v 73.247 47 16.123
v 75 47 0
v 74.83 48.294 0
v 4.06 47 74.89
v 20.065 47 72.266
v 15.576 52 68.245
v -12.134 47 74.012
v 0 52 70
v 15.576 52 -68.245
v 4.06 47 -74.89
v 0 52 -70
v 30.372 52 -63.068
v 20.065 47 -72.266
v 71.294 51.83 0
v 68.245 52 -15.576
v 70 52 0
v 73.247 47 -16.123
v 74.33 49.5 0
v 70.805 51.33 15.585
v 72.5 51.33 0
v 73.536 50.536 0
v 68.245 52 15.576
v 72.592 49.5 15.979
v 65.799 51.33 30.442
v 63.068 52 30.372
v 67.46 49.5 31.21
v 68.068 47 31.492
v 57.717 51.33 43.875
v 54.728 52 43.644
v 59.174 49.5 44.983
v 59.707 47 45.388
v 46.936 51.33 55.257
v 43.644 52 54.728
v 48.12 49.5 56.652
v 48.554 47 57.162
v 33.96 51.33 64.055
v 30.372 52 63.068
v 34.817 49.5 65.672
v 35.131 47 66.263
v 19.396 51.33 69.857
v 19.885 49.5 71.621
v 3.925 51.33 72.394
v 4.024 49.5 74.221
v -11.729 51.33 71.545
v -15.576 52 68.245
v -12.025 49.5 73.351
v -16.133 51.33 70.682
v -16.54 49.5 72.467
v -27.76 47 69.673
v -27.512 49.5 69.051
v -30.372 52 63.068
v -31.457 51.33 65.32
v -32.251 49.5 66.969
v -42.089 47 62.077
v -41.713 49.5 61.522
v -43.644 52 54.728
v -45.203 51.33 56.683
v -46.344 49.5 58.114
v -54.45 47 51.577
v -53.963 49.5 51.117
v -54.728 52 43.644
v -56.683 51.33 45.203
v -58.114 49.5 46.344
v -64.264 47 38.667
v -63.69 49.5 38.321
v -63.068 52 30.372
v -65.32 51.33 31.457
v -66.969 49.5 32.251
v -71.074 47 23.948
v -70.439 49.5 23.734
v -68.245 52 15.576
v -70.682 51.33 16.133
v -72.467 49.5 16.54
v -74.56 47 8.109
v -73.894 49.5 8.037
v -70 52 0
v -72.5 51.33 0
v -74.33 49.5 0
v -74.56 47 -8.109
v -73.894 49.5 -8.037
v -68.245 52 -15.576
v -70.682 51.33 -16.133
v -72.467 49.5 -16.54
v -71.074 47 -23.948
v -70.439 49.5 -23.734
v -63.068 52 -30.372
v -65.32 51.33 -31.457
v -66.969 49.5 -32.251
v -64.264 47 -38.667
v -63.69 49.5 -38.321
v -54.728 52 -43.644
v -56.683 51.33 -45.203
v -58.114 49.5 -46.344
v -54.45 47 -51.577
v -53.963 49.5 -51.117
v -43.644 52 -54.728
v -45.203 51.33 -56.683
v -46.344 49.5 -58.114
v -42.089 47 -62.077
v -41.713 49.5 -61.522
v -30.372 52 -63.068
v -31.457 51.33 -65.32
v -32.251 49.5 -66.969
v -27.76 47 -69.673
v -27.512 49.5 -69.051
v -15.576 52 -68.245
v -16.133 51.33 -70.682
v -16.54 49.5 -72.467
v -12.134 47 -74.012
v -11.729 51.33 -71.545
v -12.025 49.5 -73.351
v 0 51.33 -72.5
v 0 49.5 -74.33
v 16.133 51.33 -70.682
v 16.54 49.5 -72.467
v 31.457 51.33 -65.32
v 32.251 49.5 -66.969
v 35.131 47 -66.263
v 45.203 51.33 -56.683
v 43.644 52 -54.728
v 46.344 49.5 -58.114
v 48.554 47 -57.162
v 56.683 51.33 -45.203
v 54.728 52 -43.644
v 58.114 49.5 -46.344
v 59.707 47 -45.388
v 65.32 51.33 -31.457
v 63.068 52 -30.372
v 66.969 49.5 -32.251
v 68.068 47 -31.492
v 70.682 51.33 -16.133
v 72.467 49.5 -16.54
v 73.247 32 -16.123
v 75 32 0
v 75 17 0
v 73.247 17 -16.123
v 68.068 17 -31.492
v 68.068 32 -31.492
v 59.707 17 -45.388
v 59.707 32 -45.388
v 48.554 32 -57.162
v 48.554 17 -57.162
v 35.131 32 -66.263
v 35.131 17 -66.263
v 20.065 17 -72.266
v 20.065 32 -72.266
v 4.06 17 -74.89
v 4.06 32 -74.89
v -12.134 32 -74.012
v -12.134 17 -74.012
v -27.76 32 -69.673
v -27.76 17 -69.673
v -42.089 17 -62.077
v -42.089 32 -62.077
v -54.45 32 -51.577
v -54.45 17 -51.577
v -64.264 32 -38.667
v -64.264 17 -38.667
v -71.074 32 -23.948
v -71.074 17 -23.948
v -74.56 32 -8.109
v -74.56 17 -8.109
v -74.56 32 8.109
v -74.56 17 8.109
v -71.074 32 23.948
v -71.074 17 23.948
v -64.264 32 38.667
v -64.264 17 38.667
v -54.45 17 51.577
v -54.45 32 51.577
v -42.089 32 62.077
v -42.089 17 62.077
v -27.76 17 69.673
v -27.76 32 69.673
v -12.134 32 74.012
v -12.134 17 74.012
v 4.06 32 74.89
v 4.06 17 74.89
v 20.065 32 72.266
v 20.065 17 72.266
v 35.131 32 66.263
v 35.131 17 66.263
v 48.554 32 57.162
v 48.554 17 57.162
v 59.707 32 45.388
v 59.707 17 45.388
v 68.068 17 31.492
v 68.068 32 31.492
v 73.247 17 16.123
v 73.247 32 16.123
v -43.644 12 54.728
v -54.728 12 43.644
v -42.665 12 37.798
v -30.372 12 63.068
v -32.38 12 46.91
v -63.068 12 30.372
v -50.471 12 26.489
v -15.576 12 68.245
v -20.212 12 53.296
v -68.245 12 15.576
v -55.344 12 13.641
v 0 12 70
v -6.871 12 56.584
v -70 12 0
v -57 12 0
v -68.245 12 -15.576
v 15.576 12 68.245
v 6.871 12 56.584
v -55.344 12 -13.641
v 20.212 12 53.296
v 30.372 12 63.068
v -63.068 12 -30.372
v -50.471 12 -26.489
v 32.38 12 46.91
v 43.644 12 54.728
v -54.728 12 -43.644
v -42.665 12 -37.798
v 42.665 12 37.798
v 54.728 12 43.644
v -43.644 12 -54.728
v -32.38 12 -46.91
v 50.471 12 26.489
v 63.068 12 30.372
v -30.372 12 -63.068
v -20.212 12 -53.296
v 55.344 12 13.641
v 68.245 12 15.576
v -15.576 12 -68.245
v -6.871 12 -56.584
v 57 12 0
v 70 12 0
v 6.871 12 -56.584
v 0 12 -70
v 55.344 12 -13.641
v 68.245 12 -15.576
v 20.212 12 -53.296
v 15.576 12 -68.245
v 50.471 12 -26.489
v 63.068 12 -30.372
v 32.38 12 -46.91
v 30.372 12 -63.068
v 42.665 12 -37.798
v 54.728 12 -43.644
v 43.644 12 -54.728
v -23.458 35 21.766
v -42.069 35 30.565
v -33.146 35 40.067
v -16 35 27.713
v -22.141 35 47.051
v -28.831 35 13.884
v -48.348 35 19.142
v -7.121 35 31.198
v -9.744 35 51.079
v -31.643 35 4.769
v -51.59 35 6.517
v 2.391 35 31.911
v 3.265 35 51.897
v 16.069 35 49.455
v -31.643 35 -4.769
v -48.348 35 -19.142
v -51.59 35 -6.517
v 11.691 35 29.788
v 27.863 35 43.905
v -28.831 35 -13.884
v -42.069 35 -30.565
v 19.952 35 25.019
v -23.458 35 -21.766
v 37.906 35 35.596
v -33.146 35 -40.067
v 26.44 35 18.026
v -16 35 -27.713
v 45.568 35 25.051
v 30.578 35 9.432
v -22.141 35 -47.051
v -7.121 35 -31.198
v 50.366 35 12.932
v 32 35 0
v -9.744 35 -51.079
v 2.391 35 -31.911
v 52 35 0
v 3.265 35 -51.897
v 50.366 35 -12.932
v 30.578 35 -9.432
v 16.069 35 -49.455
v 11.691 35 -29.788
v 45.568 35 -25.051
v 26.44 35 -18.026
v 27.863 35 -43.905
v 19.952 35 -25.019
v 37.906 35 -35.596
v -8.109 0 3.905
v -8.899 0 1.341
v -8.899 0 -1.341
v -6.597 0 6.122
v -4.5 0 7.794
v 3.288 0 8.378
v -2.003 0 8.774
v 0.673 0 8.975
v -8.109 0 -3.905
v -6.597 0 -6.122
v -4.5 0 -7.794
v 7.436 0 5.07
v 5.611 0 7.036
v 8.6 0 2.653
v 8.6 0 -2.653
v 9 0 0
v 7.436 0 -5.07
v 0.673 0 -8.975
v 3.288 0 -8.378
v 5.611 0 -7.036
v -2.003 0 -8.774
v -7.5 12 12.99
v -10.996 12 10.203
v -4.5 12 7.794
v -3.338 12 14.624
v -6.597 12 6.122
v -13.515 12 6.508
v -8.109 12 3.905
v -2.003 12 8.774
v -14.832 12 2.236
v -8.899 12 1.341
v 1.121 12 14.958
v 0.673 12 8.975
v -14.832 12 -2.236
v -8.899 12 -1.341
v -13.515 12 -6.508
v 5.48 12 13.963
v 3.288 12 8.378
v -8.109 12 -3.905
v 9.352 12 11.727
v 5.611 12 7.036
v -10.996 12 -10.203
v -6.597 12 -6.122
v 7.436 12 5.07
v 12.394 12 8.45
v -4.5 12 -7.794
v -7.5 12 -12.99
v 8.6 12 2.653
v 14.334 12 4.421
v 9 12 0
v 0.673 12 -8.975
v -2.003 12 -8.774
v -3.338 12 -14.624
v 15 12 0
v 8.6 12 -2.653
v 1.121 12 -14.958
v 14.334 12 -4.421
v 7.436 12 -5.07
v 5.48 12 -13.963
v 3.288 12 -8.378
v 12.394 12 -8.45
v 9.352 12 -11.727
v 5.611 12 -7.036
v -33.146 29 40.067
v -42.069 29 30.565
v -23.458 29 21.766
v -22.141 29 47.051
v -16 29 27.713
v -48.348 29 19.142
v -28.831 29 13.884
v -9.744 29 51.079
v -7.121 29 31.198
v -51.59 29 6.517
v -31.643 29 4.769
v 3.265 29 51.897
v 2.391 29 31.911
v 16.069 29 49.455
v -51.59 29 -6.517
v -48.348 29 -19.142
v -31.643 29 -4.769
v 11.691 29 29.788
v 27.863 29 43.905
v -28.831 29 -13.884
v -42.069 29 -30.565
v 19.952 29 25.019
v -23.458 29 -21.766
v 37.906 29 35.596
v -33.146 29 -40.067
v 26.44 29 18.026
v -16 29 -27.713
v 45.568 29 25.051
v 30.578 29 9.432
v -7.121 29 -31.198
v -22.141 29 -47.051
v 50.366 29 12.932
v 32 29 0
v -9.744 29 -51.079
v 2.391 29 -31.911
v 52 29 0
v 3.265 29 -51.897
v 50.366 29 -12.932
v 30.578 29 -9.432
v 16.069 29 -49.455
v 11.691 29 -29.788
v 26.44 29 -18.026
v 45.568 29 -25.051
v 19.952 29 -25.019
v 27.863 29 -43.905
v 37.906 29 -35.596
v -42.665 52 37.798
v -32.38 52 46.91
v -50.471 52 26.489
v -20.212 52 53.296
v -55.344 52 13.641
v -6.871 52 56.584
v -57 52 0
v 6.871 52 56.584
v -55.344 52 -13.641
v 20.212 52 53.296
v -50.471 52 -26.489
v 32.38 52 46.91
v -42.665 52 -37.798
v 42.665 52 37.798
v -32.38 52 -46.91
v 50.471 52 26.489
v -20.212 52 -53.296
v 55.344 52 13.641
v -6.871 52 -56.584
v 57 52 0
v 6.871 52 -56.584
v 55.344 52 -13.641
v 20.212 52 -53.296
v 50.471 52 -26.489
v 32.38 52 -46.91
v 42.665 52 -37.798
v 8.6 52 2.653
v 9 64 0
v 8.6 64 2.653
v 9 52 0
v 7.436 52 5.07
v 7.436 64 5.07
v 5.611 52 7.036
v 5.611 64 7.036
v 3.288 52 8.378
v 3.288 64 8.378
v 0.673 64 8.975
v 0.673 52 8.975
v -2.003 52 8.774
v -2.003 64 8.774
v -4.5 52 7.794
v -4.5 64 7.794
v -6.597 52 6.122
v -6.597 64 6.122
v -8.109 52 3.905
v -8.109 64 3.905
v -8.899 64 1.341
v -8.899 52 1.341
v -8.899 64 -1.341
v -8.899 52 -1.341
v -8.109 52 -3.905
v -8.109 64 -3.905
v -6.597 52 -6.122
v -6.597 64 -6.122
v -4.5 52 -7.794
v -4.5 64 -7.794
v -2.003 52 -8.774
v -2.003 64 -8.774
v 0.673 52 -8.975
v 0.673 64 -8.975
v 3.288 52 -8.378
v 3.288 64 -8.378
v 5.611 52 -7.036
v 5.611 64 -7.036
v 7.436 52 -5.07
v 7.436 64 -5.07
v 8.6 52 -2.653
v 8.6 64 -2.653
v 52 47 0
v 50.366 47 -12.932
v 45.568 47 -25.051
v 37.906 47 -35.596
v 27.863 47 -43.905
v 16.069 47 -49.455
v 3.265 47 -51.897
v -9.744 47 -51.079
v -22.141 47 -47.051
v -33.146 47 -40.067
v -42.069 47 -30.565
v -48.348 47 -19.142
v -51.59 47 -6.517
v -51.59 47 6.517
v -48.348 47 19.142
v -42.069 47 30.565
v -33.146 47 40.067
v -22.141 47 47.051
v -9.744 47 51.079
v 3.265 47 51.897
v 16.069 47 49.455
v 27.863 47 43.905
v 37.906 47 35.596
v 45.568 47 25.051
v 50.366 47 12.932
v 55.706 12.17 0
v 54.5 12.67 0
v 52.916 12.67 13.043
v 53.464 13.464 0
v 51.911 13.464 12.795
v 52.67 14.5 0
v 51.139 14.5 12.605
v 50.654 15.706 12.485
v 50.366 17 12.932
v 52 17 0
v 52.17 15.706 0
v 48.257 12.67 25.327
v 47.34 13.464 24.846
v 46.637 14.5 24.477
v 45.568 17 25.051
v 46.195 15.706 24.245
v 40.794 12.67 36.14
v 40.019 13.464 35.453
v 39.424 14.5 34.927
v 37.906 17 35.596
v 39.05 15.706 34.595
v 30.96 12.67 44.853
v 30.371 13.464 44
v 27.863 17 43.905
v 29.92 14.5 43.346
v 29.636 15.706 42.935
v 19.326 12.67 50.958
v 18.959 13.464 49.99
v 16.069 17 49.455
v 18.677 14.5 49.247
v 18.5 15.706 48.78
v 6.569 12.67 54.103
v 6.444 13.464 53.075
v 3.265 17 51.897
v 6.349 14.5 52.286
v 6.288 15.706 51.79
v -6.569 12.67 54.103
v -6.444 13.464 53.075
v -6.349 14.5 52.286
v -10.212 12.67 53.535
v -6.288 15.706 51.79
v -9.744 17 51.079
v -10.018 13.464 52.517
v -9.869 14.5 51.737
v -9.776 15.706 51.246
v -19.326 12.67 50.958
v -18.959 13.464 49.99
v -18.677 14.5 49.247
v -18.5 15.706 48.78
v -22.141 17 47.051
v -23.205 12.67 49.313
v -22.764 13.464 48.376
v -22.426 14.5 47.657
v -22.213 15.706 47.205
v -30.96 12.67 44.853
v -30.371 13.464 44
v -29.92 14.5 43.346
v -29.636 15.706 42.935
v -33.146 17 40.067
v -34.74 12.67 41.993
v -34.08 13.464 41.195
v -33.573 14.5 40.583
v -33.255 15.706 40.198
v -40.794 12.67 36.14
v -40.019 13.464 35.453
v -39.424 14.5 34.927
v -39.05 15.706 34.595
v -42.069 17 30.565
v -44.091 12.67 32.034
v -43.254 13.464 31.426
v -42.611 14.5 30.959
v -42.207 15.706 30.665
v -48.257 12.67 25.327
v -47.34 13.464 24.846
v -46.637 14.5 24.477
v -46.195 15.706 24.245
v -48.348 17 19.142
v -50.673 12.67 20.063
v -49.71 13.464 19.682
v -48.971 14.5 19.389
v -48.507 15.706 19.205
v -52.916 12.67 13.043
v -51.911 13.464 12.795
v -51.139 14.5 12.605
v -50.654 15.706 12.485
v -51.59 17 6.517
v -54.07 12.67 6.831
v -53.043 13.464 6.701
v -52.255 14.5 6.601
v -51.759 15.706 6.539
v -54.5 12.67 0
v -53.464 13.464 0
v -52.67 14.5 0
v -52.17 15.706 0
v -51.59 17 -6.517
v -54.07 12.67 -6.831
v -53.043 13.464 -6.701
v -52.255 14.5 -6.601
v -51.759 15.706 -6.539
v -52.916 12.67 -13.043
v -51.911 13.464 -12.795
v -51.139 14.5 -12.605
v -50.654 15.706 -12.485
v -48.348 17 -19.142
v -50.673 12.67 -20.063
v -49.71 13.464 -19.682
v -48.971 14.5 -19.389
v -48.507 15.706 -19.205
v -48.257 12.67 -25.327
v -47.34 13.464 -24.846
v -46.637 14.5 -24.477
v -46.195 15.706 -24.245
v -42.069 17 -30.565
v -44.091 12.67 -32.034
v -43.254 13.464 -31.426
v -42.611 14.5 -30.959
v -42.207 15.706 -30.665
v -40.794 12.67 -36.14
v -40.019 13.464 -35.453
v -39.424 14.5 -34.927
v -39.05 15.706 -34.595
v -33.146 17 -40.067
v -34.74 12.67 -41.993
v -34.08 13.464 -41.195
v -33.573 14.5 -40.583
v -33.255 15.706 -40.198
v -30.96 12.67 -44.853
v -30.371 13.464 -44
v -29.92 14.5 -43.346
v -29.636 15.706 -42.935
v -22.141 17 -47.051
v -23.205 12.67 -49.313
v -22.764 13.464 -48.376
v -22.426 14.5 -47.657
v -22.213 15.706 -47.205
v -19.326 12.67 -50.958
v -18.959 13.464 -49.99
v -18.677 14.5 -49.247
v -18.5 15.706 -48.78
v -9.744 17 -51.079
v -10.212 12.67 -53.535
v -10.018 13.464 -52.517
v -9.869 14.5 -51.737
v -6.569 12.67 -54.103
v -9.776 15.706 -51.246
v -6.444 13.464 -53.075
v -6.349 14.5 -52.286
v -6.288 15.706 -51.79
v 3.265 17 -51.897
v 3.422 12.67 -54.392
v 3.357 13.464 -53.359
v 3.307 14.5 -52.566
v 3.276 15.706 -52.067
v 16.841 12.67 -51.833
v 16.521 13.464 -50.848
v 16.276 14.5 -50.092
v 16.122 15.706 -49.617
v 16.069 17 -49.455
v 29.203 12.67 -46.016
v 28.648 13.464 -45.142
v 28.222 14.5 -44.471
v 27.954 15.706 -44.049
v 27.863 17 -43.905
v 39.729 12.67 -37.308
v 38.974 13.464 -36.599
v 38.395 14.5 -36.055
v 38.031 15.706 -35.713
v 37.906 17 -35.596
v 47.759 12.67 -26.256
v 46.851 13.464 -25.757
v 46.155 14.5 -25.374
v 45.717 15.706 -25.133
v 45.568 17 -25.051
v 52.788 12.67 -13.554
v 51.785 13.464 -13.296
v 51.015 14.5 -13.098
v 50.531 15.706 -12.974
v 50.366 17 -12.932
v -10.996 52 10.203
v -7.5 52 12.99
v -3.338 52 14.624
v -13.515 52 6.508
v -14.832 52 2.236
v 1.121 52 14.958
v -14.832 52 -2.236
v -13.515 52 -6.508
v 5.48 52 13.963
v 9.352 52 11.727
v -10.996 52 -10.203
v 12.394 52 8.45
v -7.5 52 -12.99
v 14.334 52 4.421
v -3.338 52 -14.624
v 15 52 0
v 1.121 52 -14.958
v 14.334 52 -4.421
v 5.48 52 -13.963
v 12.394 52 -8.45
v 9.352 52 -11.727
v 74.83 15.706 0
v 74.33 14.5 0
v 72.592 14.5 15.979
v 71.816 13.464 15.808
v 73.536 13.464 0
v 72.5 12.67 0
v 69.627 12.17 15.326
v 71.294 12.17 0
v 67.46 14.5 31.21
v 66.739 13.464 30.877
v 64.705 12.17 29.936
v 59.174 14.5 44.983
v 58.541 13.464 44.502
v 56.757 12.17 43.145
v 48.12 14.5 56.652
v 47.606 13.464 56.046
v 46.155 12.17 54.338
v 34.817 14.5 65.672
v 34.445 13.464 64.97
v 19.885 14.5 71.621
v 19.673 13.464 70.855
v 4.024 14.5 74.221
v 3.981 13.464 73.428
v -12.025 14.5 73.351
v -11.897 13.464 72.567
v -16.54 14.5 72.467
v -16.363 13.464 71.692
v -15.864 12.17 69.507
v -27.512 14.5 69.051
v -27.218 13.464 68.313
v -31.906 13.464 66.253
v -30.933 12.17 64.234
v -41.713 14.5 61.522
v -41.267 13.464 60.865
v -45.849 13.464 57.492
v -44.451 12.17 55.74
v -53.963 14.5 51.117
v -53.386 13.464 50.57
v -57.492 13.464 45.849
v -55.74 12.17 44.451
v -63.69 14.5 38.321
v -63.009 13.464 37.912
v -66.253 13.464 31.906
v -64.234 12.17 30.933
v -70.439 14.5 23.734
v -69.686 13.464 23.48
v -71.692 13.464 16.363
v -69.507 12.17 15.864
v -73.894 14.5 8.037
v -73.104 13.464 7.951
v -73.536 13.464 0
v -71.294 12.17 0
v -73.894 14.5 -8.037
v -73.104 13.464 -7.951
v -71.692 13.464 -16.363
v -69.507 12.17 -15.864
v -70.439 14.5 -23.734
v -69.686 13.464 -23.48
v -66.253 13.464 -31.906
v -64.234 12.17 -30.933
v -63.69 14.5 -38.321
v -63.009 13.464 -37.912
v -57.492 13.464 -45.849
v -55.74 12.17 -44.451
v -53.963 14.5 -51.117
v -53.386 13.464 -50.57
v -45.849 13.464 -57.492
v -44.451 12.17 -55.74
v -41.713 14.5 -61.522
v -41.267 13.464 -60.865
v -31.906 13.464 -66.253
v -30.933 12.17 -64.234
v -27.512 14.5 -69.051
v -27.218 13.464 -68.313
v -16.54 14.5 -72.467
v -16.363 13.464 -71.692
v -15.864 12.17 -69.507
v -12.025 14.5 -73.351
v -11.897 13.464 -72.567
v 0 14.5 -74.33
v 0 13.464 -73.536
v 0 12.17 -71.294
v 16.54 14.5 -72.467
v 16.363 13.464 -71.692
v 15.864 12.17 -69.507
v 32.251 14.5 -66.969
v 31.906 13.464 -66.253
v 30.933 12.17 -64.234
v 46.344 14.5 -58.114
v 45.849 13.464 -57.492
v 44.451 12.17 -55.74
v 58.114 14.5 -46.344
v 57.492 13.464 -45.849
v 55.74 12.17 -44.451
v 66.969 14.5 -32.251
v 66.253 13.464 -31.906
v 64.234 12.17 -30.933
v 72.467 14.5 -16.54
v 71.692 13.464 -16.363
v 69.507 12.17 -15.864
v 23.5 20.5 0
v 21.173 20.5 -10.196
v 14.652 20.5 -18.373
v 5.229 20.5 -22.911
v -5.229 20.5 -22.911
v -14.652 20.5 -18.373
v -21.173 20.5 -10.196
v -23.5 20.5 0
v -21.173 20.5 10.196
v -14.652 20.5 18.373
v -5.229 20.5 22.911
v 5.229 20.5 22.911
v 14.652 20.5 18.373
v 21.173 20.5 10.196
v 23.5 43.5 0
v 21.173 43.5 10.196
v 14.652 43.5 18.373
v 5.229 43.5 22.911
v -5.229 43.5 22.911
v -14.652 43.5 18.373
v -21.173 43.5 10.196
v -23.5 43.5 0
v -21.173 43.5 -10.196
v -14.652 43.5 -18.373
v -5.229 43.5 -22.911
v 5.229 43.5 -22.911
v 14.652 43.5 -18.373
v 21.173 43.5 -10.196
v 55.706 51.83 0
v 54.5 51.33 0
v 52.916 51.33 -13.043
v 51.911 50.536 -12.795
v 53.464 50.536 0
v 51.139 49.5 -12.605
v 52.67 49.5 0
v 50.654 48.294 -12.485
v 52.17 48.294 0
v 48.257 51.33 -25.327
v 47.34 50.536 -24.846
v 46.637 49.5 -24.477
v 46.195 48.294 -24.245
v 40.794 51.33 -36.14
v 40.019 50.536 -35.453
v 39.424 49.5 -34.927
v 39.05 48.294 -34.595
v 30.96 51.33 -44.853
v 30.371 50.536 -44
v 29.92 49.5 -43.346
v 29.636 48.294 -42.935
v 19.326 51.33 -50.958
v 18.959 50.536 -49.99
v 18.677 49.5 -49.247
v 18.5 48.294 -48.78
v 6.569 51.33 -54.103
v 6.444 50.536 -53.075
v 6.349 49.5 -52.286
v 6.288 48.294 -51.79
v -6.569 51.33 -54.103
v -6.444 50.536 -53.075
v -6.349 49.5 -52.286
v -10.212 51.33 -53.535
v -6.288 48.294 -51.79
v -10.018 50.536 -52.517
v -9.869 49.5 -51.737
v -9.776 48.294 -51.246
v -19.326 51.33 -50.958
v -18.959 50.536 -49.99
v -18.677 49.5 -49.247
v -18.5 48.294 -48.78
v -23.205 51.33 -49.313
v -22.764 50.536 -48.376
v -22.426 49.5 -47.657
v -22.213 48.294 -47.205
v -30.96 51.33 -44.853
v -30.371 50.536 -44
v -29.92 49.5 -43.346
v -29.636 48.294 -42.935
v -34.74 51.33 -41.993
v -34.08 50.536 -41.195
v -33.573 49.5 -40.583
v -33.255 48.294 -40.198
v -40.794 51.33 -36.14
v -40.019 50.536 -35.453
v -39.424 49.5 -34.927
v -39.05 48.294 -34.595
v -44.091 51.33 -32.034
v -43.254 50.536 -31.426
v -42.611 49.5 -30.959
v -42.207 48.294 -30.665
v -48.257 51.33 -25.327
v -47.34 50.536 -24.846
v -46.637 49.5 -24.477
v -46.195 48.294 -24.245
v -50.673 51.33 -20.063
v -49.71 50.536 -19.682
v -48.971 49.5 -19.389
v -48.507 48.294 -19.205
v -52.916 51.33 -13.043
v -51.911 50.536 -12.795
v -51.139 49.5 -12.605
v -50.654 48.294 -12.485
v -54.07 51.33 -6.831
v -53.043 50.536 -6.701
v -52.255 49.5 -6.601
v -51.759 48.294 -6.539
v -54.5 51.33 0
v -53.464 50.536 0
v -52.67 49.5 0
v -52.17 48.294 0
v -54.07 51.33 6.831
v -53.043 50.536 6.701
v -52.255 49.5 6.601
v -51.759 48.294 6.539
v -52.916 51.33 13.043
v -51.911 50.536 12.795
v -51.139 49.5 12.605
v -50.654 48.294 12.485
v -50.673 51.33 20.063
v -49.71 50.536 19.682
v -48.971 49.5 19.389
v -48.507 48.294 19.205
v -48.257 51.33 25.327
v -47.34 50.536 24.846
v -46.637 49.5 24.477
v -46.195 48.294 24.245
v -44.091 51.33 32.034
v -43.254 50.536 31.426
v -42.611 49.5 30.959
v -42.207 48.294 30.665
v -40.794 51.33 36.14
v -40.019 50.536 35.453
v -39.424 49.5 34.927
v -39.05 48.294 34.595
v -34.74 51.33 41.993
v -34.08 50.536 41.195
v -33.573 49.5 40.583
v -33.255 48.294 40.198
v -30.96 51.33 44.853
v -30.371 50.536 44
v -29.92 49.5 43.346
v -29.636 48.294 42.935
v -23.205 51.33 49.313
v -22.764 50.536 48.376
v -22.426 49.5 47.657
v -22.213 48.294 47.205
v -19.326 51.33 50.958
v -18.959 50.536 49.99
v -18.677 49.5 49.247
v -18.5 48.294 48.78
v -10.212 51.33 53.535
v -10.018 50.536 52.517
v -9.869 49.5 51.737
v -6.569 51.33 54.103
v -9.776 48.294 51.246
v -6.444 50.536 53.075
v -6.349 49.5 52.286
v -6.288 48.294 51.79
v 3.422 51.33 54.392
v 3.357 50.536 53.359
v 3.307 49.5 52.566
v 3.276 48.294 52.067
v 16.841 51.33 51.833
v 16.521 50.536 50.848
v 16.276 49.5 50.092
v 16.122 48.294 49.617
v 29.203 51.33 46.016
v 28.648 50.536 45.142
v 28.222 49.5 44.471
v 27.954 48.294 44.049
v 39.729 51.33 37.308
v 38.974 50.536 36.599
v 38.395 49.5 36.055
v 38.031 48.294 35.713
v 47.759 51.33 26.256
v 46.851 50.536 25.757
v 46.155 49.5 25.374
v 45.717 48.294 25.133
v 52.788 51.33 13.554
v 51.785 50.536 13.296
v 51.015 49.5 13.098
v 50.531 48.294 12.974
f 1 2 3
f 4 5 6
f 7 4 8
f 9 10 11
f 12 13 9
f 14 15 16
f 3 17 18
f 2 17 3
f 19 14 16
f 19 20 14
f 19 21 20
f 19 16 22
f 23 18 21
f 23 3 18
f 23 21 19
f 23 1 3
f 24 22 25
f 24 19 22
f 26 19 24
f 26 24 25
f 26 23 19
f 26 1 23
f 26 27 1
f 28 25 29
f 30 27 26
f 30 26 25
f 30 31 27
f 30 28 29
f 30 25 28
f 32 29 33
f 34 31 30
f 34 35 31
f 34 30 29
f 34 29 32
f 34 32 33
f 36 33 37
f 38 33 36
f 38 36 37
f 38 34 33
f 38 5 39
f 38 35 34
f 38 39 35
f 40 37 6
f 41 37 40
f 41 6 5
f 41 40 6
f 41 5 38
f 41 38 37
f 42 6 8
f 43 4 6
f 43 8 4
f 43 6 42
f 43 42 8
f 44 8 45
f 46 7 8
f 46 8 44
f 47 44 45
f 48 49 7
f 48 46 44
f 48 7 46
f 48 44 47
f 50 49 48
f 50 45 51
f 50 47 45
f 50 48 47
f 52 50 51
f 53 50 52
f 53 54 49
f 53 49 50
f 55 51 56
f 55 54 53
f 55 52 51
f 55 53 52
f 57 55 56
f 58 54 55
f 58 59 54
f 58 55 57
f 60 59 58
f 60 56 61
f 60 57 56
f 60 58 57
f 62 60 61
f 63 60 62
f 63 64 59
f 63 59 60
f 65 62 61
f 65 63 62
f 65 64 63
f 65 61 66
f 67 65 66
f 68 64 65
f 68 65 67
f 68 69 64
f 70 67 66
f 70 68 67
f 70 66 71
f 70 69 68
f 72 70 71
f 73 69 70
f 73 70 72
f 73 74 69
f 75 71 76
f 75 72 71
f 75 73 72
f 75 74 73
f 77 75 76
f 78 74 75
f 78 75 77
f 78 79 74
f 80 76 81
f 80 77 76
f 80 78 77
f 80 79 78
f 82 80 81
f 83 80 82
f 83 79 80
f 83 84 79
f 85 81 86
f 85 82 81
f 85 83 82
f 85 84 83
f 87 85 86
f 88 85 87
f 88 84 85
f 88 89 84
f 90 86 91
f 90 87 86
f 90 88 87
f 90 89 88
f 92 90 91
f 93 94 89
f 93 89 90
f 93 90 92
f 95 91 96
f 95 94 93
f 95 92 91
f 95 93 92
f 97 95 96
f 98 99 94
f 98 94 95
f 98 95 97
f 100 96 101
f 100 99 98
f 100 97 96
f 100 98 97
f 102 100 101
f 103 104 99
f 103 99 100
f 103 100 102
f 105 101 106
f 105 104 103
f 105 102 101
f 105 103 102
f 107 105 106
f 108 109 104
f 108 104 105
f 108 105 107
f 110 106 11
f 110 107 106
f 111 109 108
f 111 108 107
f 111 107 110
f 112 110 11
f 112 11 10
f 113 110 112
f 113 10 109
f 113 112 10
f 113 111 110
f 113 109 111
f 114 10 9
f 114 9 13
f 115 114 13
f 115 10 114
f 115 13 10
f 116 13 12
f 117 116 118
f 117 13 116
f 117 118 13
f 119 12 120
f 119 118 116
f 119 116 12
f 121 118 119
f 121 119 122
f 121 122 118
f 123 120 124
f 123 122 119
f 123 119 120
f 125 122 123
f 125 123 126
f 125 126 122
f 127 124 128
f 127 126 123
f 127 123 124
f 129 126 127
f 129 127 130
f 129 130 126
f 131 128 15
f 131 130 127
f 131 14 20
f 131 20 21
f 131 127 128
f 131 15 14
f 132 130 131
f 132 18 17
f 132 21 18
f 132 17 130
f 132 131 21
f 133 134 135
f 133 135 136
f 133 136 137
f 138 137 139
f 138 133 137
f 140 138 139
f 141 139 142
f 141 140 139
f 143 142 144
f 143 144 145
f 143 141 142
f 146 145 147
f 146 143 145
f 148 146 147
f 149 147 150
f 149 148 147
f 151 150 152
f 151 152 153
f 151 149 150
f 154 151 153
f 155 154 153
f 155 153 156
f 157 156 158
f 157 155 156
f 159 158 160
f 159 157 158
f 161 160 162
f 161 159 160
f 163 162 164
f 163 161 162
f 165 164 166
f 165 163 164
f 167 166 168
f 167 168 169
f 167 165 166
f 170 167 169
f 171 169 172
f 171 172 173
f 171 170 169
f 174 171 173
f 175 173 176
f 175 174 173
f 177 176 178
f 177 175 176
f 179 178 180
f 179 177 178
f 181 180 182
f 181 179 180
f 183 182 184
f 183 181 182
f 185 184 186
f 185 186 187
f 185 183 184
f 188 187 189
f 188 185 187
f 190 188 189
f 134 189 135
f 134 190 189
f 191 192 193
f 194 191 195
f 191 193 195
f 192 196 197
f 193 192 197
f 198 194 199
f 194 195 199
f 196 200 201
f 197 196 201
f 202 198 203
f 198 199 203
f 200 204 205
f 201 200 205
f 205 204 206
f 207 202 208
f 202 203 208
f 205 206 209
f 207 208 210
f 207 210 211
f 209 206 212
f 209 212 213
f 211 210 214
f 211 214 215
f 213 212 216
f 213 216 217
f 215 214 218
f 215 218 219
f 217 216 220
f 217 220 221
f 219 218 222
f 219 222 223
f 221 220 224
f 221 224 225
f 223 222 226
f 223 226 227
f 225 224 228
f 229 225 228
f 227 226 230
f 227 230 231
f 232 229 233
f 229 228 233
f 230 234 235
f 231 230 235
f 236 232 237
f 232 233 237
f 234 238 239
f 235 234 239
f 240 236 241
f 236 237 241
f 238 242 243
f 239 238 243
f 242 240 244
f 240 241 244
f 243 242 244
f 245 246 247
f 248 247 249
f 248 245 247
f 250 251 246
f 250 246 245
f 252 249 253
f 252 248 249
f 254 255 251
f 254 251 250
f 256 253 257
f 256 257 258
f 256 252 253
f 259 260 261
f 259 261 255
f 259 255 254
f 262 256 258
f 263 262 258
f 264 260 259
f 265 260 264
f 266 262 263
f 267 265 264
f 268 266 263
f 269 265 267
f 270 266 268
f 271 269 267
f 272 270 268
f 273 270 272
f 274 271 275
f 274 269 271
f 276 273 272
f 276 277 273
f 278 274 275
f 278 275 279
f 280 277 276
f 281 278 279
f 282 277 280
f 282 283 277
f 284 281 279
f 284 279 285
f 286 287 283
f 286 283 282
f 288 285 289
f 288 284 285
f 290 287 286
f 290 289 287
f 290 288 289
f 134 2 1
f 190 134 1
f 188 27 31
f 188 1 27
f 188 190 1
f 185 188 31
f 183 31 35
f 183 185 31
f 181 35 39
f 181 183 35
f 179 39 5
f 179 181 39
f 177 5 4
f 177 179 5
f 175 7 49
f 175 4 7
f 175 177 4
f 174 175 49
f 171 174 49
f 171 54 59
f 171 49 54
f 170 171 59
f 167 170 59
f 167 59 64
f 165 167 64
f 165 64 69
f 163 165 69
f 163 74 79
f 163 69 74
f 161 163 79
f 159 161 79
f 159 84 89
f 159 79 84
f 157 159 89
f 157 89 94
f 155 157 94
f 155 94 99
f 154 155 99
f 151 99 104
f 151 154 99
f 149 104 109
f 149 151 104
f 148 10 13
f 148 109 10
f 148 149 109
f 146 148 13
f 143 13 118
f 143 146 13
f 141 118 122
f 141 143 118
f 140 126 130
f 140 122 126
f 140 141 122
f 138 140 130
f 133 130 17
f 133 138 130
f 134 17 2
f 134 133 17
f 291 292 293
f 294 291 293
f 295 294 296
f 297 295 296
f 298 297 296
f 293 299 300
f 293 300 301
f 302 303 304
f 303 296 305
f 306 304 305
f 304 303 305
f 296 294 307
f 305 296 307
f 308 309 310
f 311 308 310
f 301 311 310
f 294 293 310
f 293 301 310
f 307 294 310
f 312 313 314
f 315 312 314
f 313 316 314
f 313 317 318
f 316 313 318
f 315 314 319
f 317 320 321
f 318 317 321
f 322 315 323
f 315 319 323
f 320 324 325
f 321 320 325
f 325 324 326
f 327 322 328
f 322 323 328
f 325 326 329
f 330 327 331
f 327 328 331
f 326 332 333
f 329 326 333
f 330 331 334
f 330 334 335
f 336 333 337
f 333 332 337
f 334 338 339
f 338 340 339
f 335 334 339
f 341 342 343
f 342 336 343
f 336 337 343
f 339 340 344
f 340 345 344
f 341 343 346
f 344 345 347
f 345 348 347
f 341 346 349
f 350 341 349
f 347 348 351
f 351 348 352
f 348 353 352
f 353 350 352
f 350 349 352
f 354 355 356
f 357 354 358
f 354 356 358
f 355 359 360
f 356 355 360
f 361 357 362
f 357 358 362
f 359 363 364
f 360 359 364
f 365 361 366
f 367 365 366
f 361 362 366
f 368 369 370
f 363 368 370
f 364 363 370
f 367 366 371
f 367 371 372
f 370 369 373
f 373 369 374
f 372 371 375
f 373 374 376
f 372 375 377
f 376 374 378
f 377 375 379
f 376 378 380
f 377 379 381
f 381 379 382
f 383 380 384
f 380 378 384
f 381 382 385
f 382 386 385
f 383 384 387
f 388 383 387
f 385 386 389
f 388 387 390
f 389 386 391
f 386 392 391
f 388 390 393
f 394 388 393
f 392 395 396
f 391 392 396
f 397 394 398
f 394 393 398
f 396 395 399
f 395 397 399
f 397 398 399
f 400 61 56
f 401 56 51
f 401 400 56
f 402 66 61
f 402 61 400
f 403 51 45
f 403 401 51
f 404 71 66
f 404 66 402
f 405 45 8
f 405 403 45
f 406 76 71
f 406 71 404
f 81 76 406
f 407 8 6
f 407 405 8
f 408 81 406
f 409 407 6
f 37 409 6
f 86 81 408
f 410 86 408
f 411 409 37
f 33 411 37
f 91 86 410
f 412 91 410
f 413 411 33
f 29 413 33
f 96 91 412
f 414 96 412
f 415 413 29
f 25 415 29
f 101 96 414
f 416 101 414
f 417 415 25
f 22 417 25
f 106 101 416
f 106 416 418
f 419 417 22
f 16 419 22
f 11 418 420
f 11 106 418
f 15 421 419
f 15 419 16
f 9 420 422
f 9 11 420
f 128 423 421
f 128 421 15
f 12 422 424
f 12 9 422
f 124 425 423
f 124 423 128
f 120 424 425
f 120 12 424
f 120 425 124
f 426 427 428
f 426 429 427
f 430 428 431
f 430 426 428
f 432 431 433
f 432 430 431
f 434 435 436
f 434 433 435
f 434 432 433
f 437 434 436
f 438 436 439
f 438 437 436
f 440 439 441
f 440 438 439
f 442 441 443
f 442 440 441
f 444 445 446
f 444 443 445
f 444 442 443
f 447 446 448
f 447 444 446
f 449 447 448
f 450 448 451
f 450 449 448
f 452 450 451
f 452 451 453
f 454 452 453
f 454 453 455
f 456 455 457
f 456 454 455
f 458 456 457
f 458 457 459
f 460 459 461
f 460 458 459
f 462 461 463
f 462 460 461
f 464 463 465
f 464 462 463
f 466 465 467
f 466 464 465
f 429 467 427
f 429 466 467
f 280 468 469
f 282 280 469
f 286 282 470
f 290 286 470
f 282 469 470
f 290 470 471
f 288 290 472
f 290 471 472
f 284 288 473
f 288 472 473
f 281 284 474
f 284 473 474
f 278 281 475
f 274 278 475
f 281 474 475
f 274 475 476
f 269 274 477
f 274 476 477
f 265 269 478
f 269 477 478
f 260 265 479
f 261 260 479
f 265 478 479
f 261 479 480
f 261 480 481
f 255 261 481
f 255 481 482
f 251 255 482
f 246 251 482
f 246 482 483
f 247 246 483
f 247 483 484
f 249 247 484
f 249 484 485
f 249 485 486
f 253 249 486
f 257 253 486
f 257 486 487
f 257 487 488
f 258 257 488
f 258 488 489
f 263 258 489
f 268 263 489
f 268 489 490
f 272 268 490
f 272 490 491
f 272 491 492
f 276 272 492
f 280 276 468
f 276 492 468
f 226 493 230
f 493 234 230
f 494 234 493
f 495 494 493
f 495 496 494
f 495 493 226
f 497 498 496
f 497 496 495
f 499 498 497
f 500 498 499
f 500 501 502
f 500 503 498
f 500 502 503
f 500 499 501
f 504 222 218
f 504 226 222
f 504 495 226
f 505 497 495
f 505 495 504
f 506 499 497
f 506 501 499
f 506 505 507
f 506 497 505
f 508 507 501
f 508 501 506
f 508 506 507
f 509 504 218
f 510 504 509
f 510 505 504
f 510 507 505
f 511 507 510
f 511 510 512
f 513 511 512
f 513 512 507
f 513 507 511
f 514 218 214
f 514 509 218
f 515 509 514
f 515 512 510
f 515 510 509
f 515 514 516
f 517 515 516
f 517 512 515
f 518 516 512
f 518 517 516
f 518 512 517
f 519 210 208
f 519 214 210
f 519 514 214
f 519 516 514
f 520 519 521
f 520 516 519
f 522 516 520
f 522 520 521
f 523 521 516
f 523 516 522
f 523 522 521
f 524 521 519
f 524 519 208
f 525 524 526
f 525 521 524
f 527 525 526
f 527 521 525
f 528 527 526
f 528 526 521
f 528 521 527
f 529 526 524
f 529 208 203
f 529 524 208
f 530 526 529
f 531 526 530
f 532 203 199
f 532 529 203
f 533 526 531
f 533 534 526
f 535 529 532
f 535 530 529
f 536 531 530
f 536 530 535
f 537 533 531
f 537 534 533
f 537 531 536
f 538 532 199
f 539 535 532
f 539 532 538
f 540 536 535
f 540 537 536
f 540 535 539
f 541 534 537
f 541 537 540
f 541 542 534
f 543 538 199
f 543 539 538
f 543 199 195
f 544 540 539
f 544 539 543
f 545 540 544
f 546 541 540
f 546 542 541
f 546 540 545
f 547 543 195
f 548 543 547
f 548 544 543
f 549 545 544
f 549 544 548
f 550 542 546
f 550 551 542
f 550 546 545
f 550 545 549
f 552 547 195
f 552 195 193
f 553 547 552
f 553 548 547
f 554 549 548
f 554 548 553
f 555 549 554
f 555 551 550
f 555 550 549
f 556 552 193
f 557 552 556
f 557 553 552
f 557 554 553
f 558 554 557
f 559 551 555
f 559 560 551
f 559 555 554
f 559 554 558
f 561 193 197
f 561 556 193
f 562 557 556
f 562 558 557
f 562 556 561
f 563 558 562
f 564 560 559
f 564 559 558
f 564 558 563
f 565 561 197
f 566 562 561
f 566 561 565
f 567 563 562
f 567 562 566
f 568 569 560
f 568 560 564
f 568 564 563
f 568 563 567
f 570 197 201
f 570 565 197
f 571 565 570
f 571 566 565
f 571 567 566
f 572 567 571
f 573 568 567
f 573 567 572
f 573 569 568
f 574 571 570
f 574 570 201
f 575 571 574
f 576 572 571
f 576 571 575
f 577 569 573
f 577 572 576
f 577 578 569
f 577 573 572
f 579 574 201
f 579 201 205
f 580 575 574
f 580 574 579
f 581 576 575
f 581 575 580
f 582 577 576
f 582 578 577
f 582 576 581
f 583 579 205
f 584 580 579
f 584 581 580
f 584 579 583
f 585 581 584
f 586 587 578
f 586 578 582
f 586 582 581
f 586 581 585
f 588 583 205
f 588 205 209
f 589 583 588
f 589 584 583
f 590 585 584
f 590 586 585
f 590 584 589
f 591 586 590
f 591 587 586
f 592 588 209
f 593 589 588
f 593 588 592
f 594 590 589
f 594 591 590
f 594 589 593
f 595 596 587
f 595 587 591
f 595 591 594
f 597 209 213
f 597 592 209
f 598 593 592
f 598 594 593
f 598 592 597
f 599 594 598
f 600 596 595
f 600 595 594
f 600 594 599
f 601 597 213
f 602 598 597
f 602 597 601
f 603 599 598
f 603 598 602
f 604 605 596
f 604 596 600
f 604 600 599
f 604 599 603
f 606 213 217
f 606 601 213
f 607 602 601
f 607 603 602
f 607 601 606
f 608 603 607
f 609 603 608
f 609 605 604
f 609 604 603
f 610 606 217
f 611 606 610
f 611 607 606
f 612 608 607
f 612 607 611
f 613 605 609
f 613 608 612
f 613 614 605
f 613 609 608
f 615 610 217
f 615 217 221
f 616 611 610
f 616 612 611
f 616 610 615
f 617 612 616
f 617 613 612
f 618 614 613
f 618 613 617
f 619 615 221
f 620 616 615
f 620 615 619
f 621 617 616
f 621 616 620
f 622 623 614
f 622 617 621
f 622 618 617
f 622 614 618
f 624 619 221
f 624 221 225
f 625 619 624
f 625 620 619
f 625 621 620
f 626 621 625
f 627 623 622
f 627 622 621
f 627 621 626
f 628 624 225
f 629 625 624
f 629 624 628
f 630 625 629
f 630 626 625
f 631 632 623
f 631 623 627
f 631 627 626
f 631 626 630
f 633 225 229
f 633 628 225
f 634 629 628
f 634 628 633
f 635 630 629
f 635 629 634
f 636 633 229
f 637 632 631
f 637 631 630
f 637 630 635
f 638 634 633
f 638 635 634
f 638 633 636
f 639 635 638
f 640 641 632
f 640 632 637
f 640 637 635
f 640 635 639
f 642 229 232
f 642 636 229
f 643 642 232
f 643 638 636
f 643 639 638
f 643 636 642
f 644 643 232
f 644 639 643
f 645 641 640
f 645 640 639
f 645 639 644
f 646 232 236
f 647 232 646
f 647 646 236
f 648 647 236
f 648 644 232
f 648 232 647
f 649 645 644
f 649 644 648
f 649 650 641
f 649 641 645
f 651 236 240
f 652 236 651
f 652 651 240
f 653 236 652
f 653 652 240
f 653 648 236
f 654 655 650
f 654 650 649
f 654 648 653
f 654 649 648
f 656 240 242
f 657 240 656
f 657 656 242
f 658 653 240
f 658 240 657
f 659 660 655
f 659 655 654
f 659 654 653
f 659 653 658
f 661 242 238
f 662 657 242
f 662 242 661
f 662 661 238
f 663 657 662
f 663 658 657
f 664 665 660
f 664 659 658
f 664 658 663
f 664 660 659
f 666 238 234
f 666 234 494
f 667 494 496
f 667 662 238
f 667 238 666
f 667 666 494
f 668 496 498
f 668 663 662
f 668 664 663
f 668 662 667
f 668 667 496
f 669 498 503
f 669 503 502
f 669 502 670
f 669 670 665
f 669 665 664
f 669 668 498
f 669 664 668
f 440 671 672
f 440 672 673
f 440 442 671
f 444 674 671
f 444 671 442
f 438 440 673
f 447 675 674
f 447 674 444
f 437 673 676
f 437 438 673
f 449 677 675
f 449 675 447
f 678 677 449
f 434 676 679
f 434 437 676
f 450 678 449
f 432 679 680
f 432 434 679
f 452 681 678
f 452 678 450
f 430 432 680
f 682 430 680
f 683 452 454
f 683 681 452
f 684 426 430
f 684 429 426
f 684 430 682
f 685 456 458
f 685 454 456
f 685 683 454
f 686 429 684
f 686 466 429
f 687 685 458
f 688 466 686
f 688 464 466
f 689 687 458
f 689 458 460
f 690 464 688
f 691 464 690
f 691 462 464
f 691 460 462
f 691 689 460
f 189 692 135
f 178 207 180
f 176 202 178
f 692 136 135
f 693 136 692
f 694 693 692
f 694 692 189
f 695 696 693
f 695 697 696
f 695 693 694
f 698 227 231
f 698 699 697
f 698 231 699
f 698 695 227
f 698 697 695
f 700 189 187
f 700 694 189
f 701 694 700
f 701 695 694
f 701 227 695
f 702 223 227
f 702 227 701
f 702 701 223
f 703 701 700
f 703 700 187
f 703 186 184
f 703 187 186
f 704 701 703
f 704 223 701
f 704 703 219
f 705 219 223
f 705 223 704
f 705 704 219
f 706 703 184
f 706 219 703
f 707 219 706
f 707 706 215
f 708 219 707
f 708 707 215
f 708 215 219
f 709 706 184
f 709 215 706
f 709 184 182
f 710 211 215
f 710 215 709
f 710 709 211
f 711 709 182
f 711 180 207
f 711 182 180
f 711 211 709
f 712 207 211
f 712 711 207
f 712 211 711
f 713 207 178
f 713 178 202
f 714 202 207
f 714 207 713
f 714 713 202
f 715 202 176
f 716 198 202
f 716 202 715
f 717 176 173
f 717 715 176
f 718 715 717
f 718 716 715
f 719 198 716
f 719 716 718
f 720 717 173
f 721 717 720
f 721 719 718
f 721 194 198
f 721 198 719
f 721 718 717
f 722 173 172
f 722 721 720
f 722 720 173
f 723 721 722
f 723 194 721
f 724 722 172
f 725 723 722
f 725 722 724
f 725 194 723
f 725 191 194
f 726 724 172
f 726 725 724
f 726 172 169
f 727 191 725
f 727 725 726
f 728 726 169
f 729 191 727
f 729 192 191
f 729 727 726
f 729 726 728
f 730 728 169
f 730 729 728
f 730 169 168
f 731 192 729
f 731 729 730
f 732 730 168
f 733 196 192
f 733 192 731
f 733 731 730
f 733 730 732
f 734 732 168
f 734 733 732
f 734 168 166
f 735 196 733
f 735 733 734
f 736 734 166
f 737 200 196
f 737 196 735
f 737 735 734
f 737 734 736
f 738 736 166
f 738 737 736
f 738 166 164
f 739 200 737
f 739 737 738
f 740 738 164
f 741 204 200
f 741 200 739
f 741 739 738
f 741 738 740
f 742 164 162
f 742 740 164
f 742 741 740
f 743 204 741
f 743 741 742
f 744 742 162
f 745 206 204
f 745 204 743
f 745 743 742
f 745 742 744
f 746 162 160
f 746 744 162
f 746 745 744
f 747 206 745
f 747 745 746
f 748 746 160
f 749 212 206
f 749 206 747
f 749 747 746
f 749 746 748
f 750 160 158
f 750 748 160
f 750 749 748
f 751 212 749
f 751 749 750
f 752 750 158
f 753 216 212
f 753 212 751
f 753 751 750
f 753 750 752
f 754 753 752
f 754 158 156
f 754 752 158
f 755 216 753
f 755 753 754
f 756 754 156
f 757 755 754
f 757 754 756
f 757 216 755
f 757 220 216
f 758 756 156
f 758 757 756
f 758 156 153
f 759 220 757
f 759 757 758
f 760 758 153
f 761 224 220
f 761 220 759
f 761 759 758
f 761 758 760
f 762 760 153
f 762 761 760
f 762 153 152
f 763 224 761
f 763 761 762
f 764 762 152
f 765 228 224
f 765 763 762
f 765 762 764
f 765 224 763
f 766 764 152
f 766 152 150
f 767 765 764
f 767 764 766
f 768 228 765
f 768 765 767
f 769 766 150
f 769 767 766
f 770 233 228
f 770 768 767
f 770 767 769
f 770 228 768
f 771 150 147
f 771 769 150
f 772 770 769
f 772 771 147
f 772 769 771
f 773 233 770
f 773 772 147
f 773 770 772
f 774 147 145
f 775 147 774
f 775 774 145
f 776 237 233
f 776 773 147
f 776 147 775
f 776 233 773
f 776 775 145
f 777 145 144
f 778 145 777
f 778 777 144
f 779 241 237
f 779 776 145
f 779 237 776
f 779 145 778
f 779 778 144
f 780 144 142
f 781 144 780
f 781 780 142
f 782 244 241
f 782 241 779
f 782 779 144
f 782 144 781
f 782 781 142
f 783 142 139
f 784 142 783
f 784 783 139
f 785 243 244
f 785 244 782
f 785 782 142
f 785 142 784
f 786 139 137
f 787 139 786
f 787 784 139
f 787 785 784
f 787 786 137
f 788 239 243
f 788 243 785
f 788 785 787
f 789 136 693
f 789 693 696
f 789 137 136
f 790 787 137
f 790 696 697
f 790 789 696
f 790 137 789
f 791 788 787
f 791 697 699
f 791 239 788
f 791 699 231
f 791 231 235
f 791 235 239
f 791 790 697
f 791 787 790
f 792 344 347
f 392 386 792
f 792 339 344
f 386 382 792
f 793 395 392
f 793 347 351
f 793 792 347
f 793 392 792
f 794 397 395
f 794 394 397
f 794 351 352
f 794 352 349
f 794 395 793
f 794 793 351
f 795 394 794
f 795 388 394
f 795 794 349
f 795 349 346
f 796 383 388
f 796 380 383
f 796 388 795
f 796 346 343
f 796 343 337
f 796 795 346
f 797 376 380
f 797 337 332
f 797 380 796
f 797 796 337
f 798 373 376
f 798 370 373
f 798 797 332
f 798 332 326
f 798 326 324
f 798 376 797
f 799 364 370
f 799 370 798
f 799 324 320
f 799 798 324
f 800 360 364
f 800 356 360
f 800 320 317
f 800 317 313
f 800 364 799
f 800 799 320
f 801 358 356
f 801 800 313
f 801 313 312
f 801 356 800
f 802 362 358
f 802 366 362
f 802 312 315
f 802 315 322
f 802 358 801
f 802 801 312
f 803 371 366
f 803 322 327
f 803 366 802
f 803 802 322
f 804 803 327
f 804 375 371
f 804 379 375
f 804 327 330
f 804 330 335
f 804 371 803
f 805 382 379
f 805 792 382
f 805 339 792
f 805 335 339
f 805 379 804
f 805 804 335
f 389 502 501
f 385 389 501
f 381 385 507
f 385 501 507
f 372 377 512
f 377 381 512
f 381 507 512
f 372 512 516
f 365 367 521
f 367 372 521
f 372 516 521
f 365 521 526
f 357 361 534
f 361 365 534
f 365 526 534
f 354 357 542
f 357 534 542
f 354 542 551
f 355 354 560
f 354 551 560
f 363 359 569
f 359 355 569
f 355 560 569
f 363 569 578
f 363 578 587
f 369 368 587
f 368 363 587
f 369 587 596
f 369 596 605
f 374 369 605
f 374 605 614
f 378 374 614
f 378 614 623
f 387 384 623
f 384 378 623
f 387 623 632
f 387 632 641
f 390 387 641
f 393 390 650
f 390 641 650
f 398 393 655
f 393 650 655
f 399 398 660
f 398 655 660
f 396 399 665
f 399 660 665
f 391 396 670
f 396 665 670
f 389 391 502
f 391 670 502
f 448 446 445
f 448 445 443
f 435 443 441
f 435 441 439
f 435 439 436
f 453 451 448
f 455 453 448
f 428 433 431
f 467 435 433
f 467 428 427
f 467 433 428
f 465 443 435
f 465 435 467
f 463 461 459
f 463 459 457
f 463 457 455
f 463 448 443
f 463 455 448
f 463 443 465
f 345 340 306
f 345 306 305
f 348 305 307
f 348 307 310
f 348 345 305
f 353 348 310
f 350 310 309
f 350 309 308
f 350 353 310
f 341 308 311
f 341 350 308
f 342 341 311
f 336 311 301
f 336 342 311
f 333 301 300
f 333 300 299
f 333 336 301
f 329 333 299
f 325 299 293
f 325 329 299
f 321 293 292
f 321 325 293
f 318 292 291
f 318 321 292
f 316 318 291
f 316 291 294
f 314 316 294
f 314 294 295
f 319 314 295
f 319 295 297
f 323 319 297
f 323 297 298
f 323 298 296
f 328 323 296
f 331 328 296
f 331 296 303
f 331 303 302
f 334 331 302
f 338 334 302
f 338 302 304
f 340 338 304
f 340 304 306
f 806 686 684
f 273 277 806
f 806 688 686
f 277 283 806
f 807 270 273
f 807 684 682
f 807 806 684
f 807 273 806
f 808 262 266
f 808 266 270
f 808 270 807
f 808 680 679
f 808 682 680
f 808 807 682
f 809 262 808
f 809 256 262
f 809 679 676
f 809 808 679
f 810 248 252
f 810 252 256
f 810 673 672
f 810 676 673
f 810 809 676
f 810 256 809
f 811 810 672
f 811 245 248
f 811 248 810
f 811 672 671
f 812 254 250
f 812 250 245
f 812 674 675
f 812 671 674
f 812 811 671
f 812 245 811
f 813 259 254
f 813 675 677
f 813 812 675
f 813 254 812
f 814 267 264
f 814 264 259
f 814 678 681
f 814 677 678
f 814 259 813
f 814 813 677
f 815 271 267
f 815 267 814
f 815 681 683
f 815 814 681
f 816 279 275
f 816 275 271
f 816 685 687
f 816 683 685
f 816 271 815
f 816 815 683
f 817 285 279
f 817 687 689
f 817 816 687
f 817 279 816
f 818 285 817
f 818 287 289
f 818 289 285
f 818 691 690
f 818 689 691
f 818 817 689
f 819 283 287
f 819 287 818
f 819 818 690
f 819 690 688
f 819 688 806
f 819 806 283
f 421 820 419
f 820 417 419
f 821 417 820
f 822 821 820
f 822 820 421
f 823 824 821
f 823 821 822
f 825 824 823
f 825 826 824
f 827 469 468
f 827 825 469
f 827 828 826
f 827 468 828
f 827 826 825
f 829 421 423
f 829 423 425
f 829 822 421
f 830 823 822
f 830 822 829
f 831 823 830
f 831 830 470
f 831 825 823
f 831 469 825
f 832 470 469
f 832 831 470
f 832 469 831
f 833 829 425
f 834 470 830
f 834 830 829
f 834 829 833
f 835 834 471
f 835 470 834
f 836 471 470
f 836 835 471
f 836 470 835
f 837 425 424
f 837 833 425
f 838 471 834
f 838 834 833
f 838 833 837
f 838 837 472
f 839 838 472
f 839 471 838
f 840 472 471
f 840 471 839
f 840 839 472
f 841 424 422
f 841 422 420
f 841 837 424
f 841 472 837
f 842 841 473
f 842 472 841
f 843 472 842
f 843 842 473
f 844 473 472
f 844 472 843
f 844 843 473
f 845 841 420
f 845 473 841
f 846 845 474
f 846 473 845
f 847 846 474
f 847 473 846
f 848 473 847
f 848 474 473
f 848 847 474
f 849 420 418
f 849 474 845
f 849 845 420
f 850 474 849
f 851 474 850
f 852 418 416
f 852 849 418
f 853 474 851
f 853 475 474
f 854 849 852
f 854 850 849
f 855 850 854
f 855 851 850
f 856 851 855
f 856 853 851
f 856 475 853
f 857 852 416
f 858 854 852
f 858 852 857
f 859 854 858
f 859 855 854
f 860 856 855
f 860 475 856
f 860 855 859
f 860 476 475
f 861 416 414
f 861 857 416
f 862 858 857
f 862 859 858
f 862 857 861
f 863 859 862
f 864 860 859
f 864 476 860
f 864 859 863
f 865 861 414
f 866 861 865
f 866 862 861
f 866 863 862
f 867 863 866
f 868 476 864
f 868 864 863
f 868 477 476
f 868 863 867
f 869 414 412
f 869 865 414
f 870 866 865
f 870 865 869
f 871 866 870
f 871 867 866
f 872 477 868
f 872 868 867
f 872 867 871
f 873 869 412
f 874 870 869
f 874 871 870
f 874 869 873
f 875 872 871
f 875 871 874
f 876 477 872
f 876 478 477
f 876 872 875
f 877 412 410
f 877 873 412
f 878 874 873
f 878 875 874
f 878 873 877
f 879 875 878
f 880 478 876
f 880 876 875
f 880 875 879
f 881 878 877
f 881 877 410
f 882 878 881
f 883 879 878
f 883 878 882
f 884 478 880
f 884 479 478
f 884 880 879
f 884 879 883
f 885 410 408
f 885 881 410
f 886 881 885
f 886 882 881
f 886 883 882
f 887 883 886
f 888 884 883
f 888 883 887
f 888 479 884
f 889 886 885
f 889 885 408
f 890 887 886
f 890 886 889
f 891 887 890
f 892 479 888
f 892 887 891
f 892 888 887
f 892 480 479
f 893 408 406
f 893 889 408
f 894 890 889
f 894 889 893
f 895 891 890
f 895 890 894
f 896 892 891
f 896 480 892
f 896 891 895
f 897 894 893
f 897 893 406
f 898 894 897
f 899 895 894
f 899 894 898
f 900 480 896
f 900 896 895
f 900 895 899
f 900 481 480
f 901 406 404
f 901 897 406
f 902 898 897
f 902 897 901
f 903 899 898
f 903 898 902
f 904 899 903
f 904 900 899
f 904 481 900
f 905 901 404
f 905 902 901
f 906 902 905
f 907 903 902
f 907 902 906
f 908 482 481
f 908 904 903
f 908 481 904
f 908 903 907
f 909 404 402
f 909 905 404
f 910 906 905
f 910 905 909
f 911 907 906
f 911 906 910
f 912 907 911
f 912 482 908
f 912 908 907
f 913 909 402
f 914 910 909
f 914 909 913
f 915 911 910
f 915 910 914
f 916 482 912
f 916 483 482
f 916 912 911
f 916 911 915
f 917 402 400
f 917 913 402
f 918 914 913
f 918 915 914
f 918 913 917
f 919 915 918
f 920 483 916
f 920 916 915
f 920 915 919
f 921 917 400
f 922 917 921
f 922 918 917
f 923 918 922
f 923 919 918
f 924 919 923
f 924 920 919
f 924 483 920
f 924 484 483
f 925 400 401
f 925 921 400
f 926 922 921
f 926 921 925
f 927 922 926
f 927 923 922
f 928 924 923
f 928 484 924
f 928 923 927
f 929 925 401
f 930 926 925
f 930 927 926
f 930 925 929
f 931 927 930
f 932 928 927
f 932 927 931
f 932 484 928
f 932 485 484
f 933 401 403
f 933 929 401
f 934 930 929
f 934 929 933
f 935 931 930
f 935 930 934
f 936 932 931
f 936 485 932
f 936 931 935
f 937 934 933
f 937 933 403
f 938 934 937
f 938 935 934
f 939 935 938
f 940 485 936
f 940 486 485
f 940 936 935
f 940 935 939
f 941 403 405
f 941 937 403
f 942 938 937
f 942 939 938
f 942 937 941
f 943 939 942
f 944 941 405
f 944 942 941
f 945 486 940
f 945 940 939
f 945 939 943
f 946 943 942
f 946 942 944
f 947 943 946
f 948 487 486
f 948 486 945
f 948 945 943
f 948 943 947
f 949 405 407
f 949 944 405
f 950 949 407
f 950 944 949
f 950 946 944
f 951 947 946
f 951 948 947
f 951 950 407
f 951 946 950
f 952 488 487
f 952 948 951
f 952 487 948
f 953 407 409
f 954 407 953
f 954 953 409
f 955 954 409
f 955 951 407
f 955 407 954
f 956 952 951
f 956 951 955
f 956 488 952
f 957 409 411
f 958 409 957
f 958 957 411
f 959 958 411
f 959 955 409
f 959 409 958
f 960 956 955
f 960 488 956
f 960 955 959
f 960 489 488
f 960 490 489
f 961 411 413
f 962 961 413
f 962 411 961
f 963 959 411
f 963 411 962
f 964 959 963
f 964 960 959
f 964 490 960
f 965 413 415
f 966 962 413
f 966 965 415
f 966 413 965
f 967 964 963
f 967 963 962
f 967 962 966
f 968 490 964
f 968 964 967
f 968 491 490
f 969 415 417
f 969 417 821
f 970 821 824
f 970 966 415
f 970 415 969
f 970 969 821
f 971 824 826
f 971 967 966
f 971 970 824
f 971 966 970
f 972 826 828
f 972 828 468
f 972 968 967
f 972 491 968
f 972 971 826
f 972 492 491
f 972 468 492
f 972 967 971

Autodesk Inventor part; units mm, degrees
ref_plane "YZ Plane" through (0, 0, 0) normal (1, 0, 0) x (0, 1, 0)
ref_plane "XZ Plane" through (0, 0, 0) normal (0, 1, 0) x (-1, 0, 0)
ref_plane "XY Plane" through (0, 0, 0) normal (0, 0, 1) x (1, 0, 0)
sketch "スケッチ1" plane through (0, 0, 0) normal (0, 0, 1) x (1, 0, 0)
  line L0 (0, 0) -> (0, 64)
  line L1 (0, 32) -> (75, 32) construction
  line L2 (0, 0) -> (9, 0)
  line L3 (9, 0) -> (9, 12)
  line L4 (9, 12) -> (15, 12)
  line L5 (15, 12) -> (32, 29)
  line L6 (32, 29) -> (52, 29)
  line L7 (52, 29) -> (52, 12)
  line L8 (52, 12) -> (75, 12)
  line L9 (75, 12) -> (75, 32)
  line L10 (0, 64) -> (9, 64)
  line L11 (9, 64) -> (9, 52)
  line L12 (9, 52) -> (15, 52)
  line L13 (15, 52) -> (32, 35)
  line L14 (32, 35) -> (52, 35)
  line L15 (52, 35) -> (52, 52)
  line L16 (52, 52) -> (75, 52)
  line L17 (75, 52) -> (75, 32)
  dimension "d0" = 9
  dimension "d1" = 12
  dimension "d3" = 3
  dimension "d6" = 20
  dimension "d7" = 135
  dimension "d8" = 75
  dimension "d9" = 20
  dimension "d10" = 20
  dimension "d14" = 15
revolve "回転1" add sketch "スケッチ1" angle 360 about axis through (0, 0, 0) along (0, 1, 0)
fillet "フィレット1" radius 5 2 edges at (-75, 12, 0) (-75, 52, 0)
fillet "フィレット2" radius 5 2 edges at (-52, 12, 0) (-52, 52, 0)
properties part number "自由輪パーツ3"
